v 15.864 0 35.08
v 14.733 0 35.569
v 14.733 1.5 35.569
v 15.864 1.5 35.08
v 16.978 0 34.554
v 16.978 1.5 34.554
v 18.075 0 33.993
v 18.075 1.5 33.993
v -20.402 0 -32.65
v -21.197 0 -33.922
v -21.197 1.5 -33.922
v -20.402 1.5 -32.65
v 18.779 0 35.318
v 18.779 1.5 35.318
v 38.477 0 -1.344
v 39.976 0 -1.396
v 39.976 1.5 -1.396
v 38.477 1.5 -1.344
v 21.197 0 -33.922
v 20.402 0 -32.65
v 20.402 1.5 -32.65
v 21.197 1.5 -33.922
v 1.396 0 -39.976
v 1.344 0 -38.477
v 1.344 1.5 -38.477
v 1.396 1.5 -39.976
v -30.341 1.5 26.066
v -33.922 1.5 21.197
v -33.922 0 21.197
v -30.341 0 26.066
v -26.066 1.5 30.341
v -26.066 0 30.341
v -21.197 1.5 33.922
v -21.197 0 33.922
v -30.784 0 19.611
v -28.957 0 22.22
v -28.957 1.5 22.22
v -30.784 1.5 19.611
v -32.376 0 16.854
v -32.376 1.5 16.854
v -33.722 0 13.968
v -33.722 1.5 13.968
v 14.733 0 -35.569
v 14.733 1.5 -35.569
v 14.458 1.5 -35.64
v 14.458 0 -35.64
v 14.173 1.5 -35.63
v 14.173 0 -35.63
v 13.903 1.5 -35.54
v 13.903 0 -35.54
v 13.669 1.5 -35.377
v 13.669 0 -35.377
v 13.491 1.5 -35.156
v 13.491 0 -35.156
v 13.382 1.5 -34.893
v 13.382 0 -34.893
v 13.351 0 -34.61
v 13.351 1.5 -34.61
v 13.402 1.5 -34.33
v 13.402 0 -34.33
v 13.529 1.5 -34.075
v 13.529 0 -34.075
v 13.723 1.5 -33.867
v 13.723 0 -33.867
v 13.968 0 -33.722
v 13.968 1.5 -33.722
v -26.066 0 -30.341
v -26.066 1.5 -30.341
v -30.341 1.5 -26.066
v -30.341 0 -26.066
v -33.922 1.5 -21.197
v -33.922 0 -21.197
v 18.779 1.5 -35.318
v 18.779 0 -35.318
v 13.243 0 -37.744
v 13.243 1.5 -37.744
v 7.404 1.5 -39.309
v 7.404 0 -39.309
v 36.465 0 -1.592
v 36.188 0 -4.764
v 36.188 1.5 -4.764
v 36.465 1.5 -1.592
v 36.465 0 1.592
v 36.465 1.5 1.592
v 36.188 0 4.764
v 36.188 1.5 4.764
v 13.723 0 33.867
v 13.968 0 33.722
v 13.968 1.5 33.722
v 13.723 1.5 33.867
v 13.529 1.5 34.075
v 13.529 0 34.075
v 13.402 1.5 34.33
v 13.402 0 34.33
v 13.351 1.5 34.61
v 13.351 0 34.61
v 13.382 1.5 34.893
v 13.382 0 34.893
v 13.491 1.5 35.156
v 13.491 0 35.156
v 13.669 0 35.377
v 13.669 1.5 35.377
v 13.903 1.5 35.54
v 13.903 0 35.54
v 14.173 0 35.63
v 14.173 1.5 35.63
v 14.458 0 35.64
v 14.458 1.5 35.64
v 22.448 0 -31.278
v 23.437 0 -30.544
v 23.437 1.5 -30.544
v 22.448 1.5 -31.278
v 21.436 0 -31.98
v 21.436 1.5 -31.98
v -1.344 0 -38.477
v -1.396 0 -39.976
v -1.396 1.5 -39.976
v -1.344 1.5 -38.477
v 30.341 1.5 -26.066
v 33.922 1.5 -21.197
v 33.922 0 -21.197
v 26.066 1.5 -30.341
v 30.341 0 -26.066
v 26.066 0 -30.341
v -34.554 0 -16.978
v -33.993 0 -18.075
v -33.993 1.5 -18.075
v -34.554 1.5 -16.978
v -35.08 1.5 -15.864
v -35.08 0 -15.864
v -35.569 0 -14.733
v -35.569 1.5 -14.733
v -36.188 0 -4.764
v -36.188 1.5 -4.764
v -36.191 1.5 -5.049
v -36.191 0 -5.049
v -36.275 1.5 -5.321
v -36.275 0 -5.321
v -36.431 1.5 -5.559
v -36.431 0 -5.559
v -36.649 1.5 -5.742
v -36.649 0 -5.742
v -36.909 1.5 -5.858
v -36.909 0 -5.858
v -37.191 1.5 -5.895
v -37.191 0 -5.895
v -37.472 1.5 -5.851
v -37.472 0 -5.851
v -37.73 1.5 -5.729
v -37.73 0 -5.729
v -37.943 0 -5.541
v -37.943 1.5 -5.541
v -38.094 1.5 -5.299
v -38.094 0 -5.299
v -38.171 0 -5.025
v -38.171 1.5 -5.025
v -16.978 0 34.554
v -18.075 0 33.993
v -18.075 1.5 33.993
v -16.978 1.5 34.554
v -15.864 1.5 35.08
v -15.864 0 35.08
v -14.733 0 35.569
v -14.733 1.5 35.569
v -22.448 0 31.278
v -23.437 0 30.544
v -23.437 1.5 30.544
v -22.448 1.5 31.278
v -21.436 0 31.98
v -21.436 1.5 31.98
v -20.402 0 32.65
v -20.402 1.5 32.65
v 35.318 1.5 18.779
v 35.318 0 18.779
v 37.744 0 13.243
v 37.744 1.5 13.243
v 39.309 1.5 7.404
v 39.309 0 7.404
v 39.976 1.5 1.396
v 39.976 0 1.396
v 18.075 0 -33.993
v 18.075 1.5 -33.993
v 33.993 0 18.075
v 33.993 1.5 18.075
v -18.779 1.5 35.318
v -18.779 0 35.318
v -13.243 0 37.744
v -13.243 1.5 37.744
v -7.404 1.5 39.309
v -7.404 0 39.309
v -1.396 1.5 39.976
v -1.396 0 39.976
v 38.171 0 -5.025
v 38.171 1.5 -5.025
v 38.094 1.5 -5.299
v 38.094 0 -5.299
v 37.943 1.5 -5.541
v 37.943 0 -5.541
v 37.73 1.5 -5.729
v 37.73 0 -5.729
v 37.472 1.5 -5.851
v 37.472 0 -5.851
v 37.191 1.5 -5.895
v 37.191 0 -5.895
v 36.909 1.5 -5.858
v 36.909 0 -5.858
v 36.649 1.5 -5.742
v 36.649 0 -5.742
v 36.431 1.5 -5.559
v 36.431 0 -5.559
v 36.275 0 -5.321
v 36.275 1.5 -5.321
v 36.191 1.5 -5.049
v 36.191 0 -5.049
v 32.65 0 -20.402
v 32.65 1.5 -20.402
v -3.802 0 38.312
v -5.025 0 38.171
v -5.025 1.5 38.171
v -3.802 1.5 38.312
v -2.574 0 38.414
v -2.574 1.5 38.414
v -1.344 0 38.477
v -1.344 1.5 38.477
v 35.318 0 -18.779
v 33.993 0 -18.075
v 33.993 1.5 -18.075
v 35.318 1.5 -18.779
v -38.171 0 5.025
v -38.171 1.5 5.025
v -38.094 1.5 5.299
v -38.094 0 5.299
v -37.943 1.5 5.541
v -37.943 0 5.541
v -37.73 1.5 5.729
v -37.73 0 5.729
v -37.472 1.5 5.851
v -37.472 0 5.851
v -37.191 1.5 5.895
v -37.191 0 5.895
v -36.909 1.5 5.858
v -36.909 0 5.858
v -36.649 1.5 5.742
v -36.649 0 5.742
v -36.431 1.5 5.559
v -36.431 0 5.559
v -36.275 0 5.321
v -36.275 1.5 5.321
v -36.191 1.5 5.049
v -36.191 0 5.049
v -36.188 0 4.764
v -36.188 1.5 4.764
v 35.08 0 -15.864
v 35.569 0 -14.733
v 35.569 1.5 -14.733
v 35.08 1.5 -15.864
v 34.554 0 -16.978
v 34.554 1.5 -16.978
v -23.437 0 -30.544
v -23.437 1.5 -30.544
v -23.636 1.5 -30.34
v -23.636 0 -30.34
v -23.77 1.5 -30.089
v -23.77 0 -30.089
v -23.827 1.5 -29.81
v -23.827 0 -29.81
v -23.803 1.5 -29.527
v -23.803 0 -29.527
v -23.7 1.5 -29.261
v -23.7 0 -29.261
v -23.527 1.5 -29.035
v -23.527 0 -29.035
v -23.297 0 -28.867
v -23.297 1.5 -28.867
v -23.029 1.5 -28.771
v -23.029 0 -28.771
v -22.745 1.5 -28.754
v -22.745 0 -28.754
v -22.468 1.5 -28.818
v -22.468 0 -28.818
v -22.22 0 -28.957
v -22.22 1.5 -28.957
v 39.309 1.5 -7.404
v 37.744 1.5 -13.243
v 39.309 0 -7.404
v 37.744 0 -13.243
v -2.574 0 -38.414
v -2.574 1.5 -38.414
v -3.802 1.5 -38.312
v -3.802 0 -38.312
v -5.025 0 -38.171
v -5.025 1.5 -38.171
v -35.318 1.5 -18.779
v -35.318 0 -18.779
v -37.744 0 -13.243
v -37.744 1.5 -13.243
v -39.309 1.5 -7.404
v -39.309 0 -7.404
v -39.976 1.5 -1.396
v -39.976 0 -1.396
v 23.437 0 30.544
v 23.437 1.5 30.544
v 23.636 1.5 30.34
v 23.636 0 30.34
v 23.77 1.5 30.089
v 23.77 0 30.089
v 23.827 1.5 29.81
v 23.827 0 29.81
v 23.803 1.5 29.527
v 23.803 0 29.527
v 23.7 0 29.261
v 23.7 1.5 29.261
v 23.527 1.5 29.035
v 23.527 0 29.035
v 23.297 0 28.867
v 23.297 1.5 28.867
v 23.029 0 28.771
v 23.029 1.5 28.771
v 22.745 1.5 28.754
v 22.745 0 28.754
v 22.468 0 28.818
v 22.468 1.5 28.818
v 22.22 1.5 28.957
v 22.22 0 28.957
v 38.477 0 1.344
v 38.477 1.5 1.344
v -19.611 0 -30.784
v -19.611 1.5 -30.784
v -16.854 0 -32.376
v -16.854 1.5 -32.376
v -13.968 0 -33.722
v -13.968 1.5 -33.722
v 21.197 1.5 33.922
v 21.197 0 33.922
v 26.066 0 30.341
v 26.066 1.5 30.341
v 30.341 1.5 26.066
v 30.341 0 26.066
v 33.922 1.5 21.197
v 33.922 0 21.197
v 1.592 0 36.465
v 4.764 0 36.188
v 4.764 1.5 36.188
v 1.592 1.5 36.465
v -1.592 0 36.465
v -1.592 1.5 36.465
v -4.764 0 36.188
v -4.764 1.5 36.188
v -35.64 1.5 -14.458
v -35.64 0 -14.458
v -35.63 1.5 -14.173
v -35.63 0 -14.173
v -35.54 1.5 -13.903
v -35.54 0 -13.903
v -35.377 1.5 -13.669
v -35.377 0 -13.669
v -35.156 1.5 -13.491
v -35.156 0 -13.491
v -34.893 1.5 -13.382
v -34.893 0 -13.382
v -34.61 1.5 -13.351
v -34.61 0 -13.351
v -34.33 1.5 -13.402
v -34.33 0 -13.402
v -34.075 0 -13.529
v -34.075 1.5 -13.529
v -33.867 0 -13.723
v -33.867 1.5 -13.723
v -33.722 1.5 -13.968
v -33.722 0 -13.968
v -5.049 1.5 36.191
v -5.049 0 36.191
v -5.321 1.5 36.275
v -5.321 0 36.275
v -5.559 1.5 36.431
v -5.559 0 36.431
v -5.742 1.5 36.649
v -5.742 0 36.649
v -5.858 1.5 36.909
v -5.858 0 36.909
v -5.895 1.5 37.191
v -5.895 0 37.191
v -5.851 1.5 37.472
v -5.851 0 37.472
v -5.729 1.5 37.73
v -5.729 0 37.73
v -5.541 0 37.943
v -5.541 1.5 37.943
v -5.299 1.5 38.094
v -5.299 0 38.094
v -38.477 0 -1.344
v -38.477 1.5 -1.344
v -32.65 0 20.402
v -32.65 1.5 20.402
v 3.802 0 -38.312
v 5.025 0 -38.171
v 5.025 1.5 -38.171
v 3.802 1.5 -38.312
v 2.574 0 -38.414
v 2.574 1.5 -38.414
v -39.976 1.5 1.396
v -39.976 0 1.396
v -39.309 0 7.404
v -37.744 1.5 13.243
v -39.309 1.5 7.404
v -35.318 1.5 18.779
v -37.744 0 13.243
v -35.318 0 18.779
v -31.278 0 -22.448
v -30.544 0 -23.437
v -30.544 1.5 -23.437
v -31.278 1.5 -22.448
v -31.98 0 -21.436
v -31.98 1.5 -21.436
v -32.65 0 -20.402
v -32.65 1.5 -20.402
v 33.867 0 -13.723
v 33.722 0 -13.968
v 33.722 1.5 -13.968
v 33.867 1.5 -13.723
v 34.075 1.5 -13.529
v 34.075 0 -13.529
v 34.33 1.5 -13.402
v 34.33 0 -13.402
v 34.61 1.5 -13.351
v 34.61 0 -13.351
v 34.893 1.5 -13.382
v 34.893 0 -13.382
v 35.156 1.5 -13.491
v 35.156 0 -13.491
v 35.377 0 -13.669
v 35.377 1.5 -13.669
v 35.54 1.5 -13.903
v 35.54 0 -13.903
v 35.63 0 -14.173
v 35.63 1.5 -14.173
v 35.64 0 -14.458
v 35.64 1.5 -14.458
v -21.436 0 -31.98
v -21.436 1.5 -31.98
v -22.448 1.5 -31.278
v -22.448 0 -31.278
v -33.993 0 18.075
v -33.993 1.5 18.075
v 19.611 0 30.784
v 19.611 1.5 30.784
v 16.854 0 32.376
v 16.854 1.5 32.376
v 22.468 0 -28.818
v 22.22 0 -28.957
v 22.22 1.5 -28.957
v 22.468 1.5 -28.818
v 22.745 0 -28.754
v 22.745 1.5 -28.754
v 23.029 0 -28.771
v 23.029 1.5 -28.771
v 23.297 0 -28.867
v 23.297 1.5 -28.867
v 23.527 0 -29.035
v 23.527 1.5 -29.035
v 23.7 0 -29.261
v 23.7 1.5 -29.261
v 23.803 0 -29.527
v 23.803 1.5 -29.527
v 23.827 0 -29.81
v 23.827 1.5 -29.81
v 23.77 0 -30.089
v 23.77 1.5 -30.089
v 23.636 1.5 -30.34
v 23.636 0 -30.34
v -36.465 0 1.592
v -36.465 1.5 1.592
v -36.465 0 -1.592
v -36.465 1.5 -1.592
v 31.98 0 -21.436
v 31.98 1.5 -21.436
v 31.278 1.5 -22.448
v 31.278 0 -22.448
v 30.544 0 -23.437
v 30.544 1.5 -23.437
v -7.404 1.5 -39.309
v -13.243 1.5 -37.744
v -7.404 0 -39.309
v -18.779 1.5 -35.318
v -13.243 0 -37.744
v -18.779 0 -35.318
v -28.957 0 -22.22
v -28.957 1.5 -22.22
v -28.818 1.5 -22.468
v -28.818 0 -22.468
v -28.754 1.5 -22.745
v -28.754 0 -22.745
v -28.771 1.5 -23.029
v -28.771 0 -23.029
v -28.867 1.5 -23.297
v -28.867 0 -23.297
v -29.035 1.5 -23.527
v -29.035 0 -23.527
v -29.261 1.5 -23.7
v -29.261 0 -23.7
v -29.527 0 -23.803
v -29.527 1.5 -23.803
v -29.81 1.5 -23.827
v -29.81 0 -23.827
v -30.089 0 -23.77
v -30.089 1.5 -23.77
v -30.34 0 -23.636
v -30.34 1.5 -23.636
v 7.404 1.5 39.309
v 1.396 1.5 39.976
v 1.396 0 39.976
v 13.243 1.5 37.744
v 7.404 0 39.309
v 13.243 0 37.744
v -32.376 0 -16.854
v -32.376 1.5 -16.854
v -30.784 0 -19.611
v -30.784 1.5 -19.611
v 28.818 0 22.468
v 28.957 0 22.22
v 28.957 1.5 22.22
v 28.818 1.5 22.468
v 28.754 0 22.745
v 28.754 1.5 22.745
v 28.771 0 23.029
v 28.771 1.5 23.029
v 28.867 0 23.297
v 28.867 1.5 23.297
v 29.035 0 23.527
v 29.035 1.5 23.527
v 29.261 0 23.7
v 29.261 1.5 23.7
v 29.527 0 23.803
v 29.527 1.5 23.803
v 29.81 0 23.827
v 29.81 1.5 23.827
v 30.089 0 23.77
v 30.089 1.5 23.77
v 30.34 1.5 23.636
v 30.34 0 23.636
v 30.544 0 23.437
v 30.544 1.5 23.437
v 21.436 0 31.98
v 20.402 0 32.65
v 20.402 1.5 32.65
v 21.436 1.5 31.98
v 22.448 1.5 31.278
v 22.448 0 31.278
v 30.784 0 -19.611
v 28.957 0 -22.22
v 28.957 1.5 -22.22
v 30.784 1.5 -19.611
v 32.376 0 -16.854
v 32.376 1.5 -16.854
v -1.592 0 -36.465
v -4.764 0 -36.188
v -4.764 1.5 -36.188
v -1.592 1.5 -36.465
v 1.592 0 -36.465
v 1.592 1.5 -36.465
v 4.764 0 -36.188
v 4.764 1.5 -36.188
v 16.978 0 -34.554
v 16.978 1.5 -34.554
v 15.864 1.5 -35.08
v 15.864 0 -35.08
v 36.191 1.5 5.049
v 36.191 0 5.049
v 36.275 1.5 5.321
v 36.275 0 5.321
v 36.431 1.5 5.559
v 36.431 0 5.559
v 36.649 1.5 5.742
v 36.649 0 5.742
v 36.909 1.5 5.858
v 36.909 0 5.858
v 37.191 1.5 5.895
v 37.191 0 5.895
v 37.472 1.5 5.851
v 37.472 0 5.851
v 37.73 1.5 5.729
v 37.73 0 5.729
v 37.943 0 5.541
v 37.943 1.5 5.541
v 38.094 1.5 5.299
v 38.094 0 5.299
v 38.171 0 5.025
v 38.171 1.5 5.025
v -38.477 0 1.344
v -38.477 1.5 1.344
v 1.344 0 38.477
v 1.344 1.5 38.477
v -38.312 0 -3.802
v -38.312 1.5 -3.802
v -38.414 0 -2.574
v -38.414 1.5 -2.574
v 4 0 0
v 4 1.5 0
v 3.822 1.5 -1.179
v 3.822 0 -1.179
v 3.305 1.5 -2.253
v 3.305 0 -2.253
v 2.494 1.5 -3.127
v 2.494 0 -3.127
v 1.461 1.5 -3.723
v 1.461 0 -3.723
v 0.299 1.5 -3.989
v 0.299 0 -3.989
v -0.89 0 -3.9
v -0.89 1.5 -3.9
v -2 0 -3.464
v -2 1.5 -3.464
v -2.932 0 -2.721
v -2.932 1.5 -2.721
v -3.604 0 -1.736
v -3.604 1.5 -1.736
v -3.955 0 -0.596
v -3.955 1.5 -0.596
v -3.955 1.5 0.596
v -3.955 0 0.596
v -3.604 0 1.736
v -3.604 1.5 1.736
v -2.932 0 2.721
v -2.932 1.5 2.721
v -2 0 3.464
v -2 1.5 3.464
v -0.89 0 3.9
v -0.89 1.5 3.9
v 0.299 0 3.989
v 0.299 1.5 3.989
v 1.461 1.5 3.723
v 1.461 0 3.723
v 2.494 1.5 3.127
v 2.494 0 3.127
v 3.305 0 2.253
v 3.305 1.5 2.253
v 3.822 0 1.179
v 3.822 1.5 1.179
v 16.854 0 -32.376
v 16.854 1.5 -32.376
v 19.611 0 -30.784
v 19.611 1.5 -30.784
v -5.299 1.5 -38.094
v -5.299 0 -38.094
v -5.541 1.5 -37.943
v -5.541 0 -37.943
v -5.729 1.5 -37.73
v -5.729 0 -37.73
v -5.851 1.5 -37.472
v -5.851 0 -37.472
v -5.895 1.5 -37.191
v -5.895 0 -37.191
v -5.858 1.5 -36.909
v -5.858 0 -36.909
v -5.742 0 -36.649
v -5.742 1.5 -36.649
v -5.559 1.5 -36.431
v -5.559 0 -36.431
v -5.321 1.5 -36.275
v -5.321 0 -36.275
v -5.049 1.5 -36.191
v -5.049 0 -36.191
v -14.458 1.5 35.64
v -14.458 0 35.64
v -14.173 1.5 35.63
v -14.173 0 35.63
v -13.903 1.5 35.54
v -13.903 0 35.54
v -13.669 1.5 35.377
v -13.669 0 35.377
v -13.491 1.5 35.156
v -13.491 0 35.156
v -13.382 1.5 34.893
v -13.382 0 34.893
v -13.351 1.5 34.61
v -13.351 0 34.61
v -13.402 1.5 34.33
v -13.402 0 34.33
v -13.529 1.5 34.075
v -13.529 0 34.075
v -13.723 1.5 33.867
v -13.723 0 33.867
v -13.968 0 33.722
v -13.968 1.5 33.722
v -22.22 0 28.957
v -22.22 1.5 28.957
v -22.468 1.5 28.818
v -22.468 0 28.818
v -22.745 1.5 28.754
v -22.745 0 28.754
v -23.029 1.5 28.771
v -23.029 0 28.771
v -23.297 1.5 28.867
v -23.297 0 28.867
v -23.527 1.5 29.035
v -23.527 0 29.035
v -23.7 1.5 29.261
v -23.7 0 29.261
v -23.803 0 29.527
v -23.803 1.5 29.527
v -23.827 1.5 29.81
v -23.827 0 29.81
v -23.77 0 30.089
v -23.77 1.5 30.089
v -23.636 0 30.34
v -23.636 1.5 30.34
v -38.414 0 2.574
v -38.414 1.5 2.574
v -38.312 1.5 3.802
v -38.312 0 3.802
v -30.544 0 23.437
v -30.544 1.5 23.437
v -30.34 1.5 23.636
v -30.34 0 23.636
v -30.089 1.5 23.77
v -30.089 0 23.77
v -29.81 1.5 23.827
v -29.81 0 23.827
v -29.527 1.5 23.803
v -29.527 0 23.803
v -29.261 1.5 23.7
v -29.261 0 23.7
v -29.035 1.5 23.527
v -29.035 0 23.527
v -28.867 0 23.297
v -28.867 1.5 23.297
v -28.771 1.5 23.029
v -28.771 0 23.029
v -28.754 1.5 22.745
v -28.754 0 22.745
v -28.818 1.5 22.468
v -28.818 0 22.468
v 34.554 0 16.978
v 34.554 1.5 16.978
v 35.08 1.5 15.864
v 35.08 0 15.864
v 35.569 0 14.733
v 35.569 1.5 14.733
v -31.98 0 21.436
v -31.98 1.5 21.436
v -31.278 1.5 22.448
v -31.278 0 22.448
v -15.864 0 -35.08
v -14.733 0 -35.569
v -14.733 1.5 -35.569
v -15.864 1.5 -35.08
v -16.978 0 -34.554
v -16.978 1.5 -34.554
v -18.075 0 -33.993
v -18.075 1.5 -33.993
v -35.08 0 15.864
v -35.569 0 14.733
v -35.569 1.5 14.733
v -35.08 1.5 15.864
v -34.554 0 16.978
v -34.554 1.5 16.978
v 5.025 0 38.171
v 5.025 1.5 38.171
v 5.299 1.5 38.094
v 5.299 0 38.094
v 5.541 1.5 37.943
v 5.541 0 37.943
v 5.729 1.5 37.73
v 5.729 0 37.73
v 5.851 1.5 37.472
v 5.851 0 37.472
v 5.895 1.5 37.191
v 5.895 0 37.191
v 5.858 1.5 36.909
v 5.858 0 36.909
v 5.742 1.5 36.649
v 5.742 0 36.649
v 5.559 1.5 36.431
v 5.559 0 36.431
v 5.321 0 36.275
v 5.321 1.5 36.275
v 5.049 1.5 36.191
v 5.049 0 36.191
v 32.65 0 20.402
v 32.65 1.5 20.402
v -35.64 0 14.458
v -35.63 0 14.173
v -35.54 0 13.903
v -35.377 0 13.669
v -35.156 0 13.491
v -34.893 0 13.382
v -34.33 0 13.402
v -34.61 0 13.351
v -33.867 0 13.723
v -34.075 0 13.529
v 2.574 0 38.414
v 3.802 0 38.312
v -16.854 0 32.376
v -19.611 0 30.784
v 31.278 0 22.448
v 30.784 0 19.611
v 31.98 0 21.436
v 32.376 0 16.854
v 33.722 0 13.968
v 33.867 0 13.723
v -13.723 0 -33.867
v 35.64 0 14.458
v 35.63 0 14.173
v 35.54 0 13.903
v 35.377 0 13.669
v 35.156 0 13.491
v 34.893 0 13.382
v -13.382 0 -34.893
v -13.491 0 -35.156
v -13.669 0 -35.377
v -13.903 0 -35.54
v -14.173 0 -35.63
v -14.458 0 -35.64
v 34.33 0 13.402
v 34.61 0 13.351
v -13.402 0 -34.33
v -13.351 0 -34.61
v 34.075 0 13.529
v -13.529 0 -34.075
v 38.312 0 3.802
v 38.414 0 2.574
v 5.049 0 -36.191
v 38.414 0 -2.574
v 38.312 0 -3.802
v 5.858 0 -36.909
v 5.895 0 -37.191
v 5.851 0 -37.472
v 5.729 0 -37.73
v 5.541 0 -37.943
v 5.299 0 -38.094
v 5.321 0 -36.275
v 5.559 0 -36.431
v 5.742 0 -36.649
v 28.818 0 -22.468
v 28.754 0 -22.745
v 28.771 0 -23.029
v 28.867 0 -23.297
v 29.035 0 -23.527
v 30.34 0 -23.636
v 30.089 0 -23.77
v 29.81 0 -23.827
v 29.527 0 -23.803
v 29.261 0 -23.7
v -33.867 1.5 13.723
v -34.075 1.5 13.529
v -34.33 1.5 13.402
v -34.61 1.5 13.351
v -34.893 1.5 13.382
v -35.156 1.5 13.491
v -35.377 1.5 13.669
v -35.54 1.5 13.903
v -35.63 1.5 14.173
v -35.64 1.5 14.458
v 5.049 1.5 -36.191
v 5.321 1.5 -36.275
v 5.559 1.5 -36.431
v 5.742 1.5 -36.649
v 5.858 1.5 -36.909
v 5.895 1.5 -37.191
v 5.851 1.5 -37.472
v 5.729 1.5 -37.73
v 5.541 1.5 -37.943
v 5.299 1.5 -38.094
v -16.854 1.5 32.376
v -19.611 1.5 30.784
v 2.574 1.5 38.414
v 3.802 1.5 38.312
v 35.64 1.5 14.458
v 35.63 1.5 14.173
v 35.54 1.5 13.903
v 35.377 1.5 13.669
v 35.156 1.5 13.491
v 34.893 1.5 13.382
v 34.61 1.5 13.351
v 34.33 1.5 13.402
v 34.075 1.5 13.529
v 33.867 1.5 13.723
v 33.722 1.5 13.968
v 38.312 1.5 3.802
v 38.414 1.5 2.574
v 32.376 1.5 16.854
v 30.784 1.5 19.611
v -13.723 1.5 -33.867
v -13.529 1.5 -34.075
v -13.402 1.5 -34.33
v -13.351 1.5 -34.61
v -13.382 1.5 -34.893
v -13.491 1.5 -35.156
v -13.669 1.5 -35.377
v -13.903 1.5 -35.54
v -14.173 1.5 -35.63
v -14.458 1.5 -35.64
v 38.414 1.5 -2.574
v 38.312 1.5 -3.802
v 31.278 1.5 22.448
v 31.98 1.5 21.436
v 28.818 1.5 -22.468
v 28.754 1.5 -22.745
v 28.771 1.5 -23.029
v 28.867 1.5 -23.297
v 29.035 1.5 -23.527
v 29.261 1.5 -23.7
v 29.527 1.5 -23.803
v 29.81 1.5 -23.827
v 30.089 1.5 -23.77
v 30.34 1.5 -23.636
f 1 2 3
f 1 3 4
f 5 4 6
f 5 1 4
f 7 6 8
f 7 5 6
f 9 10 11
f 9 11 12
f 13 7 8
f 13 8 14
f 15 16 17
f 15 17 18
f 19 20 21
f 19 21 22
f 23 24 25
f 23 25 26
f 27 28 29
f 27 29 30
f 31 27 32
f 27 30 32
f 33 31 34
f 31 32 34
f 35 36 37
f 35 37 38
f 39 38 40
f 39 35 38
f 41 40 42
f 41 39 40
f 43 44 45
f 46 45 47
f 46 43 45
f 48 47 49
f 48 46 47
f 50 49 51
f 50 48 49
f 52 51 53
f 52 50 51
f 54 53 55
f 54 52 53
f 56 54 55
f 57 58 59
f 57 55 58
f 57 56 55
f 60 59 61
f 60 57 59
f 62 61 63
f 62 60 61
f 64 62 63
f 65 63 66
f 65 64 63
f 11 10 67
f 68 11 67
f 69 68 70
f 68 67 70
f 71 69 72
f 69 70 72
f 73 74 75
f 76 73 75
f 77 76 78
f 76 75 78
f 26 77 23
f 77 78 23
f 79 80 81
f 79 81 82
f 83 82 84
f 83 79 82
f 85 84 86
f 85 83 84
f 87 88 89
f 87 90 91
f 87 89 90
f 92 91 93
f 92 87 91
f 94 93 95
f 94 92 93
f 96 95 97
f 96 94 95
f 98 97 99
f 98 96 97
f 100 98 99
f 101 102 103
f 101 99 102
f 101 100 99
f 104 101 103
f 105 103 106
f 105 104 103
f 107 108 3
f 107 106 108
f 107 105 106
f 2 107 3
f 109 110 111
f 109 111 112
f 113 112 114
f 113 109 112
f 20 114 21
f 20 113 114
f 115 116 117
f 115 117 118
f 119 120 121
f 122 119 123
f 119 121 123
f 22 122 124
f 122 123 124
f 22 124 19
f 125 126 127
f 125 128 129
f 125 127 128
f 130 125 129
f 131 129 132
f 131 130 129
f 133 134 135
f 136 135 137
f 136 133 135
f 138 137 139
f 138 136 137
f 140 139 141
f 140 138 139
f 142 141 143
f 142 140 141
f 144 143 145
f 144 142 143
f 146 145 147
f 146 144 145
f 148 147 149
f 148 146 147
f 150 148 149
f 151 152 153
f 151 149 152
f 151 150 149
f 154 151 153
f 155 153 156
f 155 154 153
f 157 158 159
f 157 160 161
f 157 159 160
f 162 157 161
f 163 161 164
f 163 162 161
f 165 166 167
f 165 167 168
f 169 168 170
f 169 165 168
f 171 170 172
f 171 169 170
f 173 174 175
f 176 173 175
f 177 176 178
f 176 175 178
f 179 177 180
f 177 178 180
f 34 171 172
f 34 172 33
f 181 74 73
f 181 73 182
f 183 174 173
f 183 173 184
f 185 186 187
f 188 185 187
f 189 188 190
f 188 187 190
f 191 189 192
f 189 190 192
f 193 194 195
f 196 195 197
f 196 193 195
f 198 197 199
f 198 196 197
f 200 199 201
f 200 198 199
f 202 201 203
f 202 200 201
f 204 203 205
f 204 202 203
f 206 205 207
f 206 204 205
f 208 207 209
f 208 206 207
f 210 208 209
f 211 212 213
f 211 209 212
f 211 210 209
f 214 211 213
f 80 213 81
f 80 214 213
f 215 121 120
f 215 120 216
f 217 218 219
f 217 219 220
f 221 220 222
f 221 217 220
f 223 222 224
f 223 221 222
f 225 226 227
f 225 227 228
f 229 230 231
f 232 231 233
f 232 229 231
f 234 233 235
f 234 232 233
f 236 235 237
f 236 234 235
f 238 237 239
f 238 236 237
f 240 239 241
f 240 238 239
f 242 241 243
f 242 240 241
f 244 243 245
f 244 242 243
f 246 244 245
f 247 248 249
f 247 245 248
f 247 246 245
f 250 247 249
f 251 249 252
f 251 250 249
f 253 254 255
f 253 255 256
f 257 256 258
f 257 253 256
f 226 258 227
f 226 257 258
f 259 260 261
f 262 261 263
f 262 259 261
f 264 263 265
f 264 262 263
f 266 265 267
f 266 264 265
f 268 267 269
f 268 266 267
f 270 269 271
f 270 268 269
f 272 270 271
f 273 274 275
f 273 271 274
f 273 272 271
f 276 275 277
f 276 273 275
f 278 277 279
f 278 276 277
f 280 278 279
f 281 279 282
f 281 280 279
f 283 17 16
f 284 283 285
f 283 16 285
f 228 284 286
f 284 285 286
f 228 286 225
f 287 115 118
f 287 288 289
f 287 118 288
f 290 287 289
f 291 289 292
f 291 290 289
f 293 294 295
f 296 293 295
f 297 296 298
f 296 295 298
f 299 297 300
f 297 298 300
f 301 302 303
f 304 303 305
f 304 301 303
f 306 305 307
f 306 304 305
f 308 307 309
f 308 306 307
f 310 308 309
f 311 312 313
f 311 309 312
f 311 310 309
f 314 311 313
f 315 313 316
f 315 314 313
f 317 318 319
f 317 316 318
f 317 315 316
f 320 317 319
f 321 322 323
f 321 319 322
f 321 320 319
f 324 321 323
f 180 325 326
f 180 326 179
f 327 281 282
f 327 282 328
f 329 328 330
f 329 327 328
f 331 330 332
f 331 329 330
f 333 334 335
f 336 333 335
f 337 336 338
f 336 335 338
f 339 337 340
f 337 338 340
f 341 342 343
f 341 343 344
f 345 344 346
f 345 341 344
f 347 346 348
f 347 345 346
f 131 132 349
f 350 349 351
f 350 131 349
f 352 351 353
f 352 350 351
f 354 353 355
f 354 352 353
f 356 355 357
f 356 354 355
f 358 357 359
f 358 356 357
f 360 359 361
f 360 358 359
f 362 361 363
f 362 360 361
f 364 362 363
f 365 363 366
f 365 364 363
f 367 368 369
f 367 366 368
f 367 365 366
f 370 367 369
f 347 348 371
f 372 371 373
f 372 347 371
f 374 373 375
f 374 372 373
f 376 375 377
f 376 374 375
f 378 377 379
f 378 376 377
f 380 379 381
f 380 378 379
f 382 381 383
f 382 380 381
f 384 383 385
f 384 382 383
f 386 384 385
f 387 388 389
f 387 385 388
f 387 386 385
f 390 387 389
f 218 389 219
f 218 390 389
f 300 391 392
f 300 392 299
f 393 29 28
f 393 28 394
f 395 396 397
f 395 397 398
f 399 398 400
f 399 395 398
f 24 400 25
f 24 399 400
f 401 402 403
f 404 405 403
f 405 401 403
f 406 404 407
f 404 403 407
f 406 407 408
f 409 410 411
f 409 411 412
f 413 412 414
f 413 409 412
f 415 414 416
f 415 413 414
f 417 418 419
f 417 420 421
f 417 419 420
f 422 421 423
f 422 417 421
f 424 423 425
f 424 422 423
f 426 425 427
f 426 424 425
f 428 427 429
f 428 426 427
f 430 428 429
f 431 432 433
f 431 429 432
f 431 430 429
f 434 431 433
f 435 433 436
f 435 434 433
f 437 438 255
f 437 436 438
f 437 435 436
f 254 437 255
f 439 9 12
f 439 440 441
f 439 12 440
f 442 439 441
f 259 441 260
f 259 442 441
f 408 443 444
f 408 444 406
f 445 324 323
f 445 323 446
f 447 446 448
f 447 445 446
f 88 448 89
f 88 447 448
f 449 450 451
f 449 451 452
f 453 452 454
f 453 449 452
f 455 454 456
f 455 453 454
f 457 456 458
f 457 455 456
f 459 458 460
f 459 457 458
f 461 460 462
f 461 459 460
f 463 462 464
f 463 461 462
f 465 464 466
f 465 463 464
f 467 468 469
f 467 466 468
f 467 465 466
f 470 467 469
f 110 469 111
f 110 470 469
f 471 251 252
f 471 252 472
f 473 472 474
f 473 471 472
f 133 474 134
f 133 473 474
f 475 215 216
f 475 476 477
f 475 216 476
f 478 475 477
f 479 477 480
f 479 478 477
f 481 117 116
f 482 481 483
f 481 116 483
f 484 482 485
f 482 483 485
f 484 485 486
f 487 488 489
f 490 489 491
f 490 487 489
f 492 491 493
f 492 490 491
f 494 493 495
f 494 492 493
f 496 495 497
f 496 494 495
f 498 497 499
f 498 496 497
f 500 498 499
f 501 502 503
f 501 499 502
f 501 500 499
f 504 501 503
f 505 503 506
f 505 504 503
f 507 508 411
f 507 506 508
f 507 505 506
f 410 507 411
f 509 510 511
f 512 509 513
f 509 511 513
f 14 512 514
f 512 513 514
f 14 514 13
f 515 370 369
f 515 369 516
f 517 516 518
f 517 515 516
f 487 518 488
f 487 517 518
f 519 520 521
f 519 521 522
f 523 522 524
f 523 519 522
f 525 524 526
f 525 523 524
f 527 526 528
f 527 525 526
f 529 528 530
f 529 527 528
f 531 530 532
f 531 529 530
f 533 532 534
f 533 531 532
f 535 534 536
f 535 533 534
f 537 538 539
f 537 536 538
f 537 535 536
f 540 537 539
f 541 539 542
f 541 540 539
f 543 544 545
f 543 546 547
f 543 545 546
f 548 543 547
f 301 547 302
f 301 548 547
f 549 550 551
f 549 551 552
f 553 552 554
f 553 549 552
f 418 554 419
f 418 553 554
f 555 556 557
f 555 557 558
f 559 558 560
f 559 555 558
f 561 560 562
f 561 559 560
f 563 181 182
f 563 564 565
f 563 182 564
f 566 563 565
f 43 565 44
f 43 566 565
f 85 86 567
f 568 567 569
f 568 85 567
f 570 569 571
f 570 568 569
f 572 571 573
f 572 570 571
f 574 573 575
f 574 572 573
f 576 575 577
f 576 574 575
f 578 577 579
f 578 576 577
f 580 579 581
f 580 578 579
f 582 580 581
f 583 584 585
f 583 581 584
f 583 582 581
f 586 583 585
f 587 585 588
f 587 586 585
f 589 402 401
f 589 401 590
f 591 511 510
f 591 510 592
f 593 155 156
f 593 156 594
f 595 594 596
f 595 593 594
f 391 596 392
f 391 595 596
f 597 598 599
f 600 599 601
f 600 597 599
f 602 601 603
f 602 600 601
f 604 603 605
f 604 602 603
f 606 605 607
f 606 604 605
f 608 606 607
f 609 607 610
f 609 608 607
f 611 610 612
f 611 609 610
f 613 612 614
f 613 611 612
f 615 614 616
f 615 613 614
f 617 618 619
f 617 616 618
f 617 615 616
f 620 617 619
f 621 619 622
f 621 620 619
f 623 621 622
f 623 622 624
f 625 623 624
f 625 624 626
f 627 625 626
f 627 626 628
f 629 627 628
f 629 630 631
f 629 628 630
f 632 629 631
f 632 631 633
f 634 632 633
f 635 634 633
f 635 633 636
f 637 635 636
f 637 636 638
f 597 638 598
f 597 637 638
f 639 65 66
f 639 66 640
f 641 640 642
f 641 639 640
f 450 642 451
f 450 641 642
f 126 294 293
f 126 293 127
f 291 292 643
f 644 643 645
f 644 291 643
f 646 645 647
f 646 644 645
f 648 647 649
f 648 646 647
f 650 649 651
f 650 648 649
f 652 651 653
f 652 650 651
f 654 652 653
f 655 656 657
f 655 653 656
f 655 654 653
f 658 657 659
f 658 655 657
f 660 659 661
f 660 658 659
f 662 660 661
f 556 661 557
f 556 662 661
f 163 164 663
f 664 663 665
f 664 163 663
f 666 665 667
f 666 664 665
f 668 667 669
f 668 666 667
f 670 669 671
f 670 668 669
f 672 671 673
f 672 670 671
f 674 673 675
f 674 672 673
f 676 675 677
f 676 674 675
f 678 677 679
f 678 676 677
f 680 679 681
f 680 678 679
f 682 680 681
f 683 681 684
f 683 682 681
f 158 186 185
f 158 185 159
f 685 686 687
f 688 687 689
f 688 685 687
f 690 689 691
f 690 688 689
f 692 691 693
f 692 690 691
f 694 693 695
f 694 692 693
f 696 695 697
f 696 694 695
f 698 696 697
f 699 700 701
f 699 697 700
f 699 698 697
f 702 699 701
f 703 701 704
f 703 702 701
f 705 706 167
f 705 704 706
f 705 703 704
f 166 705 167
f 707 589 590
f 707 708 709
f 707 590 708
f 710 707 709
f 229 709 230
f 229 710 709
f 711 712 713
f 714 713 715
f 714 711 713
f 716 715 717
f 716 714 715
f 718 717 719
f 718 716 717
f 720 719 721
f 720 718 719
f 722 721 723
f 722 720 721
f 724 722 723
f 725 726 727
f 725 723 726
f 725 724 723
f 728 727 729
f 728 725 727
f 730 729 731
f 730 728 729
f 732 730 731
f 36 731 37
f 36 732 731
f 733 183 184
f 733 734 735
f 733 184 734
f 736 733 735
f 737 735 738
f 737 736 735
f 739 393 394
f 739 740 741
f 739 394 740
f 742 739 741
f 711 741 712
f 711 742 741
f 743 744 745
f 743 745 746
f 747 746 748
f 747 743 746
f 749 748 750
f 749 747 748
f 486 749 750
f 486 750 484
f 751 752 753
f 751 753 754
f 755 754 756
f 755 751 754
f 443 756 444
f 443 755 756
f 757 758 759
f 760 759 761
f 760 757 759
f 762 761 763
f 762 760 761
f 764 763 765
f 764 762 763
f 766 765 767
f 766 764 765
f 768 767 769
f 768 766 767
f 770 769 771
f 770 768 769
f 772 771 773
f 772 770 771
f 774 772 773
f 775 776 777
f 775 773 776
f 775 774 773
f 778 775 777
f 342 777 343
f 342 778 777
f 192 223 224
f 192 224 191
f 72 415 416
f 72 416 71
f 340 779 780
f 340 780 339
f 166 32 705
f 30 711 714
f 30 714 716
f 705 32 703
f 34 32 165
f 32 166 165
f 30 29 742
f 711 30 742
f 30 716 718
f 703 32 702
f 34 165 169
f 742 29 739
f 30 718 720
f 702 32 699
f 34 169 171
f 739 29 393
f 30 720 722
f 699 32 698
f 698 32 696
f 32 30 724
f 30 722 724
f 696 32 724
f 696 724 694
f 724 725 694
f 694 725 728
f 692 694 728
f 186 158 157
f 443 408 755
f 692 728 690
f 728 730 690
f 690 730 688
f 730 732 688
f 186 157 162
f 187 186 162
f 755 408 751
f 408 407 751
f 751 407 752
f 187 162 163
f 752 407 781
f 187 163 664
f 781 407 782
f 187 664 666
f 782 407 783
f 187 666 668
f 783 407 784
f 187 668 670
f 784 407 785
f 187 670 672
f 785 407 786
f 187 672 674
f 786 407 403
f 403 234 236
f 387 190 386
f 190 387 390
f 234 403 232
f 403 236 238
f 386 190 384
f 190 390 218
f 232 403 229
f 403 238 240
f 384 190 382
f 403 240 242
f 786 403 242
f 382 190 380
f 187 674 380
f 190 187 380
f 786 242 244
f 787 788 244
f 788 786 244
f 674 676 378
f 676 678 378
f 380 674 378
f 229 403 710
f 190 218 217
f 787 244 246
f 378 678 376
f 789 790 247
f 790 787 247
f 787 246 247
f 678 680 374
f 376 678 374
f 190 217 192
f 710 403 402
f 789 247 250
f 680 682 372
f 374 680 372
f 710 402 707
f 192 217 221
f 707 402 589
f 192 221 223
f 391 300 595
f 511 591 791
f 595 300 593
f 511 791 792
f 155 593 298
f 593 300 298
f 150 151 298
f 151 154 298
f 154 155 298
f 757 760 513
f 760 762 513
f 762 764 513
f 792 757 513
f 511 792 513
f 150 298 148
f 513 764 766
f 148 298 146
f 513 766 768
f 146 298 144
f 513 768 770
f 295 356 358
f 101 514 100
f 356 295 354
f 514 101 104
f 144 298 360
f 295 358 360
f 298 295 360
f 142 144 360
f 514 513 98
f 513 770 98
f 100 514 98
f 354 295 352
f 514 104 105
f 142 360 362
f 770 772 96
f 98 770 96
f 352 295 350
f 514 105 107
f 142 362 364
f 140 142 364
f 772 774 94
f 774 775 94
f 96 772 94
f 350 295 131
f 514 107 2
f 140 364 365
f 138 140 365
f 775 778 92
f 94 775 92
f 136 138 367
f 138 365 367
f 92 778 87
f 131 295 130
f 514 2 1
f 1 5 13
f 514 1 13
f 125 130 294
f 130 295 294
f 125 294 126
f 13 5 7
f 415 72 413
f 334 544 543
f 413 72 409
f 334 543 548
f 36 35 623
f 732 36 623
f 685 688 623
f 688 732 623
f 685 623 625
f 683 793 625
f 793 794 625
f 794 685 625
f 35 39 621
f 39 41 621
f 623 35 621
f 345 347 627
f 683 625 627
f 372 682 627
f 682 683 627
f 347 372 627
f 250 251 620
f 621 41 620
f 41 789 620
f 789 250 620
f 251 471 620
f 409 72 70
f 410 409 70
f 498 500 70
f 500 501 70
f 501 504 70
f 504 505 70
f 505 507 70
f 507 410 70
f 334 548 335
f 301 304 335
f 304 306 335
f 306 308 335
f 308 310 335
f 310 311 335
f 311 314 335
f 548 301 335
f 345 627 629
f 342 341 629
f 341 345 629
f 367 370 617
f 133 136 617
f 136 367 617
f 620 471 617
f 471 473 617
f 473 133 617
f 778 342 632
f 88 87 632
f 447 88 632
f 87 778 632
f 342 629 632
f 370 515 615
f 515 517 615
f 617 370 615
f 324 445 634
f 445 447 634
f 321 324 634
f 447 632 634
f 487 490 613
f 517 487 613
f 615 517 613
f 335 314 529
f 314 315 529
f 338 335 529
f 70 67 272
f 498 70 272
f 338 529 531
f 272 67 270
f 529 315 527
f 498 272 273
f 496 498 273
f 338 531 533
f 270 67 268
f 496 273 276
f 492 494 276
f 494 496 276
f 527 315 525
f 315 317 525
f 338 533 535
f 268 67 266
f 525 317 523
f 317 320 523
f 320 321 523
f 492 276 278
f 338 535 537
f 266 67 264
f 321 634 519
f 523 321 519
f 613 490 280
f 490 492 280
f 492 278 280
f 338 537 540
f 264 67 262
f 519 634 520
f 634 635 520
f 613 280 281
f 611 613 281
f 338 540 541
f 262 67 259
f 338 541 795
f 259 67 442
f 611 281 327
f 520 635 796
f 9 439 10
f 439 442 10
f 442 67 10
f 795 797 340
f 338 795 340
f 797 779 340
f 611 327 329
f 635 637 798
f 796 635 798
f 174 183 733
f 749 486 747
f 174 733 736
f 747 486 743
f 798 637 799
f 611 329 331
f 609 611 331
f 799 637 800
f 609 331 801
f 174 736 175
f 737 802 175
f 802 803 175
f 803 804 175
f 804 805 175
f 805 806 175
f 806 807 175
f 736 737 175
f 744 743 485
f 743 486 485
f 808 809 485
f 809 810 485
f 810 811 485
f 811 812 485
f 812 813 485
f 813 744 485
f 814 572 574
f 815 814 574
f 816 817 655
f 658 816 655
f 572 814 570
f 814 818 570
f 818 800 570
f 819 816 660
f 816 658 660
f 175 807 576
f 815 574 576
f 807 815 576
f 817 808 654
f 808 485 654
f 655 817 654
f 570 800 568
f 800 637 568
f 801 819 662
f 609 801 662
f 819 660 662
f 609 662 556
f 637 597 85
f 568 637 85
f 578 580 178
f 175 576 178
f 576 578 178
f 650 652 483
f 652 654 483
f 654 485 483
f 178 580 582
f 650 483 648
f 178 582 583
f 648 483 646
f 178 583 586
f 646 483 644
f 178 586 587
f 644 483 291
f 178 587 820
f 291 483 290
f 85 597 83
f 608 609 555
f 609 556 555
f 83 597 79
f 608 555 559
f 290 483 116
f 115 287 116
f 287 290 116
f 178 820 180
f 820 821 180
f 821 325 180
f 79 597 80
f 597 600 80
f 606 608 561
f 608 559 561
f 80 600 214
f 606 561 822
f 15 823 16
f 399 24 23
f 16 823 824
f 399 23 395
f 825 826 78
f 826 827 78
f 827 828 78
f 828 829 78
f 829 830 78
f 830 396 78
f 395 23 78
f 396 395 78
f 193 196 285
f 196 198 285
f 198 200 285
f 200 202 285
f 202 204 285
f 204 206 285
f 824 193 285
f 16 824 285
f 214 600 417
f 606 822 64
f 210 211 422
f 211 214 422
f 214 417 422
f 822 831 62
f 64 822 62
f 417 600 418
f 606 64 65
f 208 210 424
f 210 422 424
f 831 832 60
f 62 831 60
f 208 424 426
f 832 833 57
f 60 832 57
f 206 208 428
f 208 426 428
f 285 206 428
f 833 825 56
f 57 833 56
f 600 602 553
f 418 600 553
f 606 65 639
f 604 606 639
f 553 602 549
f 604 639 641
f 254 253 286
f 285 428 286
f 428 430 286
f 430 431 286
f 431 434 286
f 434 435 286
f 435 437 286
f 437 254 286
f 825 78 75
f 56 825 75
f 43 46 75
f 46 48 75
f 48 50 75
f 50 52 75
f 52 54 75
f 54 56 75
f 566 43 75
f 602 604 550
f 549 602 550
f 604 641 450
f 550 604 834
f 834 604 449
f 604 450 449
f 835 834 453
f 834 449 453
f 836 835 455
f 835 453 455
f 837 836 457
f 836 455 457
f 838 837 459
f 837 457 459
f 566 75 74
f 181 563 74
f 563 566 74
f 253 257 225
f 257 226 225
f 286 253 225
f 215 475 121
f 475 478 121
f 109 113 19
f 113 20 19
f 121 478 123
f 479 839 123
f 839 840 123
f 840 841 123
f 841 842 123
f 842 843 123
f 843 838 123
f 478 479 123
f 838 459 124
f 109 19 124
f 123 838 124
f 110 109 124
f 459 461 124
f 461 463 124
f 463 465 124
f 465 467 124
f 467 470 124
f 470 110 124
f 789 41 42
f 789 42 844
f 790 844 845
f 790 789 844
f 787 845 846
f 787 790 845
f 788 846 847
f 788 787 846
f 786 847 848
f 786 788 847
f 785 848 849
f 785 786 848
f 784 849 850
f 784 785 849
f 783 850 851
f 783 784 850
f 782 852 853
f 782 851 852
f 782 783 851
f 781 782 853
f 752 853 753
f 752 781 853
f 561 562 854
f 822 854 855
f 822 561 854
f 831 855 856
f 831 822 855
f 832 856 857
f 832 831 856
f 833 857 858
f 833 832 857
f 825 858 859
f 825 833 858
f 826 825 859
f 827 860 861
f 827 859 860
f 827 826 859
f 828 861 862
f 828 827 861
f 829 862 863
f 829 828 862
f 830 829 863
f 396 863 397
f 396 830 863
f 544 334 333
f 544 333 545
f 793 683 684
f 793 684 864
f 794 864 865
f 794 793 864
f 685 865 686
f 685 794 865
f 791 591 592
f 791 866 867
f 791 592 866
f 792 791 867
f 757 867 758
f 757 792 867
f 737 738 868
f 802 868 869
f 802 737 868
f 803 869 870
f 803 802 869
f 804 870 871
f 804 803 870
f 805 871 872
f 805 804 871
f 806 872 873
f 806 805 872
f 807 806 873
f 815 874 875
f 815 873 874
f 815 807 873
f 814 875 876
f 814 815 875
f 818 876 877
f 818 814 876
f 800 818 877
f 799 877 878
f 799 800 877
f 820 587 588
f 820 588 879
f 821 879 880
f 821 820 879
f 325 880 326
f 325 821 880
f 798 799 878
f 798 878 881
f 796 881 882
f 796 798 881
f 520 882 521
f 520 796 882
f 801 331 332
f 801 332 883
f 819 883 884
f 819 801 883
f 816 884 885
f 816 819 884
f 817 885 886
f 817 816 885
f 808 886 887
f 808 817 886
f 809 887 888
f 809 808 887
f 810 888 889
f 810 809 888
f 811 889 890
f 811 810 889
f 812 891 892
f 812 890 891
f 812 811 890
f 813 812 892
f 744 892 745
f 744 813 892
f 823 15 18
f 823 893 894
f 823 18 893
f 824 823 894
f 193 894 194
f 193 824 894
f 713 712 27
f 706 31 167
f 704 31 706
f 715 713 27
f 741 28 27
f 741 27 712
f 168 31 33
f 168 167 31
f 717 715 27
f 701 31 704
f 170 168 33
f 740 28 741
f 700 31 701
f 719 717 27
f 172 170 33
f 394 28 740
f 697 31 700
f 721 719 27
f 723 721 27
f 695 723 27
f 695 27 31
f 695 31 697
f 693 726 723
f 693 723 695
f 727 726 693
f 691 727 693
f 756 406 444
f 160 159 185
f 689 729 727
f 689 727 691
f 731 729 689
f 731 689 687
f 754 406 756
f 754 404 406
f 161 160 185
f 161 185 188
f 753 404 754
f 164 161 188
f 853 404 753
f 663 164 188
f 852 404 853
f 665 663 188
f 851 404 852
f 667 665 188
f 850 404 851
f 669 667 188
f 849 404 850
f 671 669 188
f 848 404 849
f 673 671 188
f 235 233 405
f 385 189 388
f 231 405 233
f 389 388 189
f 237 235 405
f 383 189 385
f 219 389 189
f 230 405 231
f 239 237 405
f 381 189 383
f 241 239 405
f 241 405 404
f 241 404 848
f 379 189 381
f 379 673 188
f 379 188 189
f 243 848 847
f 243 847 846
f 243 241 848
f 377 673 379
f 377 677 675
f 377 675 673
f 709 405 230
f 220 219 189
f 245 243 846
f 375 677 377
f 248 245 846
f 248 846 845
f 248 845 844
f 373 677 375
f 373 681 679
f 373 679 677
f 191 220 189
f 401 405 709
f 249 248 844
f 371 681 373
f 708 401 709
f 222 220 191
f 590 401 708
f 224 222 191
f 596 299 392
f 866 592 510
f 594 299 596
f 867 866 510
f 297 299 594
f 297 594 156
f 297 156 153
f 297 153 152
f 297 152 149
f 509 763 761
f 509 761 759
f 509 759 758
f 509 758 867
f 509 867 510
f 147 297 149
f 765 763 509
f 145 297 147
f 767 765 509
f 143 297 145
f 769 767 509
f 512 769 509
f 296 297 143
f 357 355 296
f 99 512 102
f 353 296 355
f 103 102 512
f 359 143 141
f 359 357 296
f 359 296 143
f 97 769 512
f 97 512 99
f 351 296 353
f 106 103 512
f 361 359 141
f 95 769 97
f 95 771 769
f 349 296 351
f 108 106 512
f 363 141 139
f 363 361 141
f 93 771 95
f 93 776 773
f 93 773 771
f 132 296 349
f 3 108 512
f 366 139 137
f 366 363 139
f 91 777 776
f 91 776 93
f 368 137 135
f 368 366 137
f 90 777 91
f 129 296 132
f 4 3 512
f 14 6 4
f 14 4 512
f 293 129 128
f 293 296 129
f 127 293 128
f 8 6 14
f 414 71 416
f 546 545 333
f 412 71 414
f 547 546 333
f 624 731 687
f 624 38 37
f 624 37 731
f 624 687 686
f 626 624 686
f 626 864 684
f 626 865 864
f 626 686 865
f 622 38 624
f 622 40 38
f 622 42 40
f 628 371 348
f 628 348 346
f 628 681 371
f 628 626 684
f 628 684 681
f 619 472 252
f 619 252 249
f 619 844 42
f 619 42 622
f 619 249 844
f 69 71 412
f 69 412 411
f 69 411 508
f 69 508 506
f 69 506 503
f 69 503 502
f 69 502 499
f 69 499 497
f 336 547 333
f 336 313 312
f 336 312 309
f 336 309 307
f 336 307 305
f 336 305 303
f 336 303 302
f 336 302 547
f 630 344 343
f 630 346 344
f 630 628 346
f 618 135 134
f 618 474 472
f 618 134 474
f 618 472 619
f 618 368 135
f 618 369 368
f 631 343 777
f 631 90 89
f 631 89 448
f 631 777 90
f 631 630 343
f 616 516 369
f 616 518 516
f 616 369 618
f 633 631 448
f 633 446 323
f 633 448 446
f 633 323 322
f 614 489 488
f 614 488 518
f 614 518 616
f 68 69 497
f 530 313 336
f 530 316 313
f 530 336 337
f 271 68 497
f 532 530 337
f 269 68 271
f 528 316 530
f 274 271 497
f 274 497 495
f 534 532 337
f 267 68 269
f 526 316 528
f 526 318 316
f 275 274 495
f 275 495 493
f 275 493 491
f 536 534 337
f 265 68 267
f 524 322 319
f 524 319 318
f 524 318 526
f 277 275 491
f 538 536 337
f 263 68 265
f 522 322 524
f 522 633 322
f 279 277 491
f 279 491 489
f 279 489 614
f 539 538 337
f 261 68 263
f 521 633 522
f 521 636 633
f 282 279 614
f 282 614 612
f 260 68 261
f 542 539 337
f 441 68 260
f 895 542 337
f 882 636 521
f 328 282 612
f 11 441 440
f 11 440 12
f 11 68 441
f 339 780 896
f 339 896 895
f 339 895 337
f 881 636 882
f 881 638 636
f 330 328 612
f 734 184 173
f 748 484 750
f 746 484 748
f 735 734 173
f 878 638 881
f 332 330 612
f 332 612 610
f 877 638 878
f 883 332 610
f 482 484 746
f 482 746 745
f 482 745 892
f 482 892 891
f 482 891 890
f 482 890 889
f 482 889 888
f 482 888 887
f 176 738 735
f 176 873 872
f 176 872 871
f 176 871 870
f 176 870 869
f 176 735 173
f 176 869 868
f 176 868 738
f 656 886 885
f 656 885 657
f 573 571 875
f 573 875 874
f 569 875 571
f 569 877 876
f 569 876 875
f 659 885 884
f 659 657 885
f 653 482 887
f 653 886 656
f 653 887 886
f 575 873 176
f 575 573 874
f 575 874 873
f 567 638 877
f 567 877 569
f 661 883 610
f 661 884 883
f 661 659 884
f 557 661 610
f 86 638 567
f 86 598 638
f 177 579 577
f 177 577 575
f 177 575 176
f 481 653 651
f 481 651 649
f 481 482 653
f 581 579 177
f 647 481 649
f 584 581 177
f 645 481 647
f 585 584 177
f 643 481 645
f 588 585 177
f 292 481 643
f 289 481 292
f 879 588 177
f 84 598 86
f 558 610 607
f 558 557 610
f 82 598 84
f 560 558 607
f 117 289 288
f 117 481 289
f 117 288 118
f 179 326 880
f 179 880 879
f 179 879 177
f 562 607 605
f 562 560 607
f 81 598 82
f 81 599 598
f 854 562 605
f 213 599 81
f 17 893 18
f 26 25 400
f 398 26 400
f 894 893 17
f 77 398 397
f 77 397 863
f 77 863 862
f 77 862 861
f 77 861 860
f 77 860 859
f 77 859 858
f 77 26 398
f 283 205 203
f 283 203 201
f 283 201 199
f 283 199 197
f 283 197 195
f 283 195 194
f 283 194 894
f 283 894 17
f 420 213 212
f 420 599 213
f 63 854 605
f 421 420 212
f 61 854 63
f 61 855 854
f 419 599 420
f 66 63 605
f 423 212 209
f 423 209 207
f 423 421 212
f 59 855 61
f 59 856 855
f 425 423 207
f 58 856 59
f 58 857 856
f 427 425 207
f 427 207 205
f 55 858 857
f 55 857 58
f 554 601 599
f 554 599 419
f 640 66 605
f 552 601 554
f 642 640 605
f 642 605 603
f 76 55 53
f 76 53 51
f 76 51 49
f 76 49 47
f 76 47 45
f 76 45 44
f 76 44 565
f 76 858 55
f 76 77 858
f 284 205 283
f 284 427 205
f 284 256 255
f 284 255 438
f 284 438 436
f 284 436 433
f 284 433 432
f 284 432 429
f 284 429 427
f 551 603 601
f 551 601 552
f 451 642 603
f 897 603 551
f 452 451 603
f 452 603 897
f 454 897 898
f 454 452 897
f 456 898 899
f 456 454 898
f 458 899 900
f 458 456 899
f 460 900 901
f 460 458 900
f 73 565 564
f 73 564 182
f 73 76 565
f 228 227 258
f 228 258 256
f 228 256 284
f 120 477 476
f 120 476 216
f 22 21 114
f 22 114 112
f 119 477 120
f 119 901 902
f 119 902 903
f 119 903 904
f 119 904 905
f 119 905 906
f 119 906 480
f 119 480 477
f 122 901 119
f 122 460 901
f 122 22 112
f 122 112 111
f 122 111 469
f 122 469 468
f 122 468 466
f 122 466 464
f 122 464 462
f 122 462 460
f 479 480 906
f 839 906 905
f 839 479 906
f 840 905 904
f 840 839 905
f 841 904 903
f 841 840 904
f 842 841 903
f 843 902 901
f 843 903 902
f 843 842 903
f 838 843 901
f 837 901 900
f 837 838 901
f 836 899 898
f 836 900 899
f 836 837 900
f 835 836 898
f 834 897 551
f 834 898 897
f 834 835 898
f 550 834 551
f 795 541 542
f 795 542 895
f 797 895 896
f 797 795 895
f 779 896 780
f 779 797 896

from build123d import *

# Parameters (mm, degrees)
SKETCH1_R         = 40
WHEEL_BLANK_DEPTH = 1.5
T_SLOT_DEPTH      = 2.5
CIRPATTERN_COUNT  = 12
SKETCH3_R         = 4
CENTER_HOLE_DEPTH = 6


with BuildPart() as part:
    # Sketch1 → Wheel Blank (new body)
    with BuildSketch(Plane(origin=(0, 0, 0), x_dir=(1, 0, 0), z_dir=(0, 1, 0))):
        Circle(SKETCH1_R)
    extrude(amount=WHEEL_BLANK_DEPTH)

    # Sketch2 → T-Slot (cut, through all)
    with BuildSketch(Plane(origin=(0, 0, 0), x_dir=(1, 0, 0), z_dir=(0, 1, 0))):
        with BuildLine():
            Line((-1.395979868, 39.975633081), (-1.343630623, 38.47654684))
            ThreePointArc((-1.343630623, 38.47654684), (-3.188115989, 38.367771846), (-5.0252584, 38.170627163))
            ThreePointArc((-5.0252584, 38.170627163), (-5.88617707, 37.048656109), (-4.764206016, 36.18773744))
            ThreePointArc((-4.764206016, 36.18773744), (0, 36.5), (4.764206016, 36.18773744))
            ThreePointArc((4.764206016, 36.18773744), (5.88617707, 37.048656109), (5.0252584, 38.170627163))
            ThreePointArc((5.0252584, 38.170627163), (3.188115989, 38.367771846), (1.343630623, 38.47654684))
            Line((1.343630623, 38.47654684), (1.395979868, 39.975633081))
            ThreePointArc((1.395979868, 39.975633081), (0, 40), (-1.395979868, 39.975633081))
        make_face()
    t_slot = extrude(amount=T_SLOT_DEPTH, mode=Mode.SUBTRACT)

    # CirPattern: T-Slot ×12 about axis
    cirpattern_axis = Axis((0, 0, 0), (0, 1, 0))
    for i in range(1, CIRPATTERN_COUNT):
        add(t_slot.rotate(cirpattern_axis, i * 360 / CIRPATTERN_COUNT), mode=Mode.SUBTRACT)

    # Sketch3 → Center Hole (cut)
    with BuildSketch(Plane(origin=(0, 0, 0), x_dir=(1, 0, 0), z_dir=(0, 1, 0))):
        Circle(SKETCH3_R)
    extrude(amount=CENTER_HOLE_DEPTH, mode=Mode.SUBTRACT)


solid = part.part
